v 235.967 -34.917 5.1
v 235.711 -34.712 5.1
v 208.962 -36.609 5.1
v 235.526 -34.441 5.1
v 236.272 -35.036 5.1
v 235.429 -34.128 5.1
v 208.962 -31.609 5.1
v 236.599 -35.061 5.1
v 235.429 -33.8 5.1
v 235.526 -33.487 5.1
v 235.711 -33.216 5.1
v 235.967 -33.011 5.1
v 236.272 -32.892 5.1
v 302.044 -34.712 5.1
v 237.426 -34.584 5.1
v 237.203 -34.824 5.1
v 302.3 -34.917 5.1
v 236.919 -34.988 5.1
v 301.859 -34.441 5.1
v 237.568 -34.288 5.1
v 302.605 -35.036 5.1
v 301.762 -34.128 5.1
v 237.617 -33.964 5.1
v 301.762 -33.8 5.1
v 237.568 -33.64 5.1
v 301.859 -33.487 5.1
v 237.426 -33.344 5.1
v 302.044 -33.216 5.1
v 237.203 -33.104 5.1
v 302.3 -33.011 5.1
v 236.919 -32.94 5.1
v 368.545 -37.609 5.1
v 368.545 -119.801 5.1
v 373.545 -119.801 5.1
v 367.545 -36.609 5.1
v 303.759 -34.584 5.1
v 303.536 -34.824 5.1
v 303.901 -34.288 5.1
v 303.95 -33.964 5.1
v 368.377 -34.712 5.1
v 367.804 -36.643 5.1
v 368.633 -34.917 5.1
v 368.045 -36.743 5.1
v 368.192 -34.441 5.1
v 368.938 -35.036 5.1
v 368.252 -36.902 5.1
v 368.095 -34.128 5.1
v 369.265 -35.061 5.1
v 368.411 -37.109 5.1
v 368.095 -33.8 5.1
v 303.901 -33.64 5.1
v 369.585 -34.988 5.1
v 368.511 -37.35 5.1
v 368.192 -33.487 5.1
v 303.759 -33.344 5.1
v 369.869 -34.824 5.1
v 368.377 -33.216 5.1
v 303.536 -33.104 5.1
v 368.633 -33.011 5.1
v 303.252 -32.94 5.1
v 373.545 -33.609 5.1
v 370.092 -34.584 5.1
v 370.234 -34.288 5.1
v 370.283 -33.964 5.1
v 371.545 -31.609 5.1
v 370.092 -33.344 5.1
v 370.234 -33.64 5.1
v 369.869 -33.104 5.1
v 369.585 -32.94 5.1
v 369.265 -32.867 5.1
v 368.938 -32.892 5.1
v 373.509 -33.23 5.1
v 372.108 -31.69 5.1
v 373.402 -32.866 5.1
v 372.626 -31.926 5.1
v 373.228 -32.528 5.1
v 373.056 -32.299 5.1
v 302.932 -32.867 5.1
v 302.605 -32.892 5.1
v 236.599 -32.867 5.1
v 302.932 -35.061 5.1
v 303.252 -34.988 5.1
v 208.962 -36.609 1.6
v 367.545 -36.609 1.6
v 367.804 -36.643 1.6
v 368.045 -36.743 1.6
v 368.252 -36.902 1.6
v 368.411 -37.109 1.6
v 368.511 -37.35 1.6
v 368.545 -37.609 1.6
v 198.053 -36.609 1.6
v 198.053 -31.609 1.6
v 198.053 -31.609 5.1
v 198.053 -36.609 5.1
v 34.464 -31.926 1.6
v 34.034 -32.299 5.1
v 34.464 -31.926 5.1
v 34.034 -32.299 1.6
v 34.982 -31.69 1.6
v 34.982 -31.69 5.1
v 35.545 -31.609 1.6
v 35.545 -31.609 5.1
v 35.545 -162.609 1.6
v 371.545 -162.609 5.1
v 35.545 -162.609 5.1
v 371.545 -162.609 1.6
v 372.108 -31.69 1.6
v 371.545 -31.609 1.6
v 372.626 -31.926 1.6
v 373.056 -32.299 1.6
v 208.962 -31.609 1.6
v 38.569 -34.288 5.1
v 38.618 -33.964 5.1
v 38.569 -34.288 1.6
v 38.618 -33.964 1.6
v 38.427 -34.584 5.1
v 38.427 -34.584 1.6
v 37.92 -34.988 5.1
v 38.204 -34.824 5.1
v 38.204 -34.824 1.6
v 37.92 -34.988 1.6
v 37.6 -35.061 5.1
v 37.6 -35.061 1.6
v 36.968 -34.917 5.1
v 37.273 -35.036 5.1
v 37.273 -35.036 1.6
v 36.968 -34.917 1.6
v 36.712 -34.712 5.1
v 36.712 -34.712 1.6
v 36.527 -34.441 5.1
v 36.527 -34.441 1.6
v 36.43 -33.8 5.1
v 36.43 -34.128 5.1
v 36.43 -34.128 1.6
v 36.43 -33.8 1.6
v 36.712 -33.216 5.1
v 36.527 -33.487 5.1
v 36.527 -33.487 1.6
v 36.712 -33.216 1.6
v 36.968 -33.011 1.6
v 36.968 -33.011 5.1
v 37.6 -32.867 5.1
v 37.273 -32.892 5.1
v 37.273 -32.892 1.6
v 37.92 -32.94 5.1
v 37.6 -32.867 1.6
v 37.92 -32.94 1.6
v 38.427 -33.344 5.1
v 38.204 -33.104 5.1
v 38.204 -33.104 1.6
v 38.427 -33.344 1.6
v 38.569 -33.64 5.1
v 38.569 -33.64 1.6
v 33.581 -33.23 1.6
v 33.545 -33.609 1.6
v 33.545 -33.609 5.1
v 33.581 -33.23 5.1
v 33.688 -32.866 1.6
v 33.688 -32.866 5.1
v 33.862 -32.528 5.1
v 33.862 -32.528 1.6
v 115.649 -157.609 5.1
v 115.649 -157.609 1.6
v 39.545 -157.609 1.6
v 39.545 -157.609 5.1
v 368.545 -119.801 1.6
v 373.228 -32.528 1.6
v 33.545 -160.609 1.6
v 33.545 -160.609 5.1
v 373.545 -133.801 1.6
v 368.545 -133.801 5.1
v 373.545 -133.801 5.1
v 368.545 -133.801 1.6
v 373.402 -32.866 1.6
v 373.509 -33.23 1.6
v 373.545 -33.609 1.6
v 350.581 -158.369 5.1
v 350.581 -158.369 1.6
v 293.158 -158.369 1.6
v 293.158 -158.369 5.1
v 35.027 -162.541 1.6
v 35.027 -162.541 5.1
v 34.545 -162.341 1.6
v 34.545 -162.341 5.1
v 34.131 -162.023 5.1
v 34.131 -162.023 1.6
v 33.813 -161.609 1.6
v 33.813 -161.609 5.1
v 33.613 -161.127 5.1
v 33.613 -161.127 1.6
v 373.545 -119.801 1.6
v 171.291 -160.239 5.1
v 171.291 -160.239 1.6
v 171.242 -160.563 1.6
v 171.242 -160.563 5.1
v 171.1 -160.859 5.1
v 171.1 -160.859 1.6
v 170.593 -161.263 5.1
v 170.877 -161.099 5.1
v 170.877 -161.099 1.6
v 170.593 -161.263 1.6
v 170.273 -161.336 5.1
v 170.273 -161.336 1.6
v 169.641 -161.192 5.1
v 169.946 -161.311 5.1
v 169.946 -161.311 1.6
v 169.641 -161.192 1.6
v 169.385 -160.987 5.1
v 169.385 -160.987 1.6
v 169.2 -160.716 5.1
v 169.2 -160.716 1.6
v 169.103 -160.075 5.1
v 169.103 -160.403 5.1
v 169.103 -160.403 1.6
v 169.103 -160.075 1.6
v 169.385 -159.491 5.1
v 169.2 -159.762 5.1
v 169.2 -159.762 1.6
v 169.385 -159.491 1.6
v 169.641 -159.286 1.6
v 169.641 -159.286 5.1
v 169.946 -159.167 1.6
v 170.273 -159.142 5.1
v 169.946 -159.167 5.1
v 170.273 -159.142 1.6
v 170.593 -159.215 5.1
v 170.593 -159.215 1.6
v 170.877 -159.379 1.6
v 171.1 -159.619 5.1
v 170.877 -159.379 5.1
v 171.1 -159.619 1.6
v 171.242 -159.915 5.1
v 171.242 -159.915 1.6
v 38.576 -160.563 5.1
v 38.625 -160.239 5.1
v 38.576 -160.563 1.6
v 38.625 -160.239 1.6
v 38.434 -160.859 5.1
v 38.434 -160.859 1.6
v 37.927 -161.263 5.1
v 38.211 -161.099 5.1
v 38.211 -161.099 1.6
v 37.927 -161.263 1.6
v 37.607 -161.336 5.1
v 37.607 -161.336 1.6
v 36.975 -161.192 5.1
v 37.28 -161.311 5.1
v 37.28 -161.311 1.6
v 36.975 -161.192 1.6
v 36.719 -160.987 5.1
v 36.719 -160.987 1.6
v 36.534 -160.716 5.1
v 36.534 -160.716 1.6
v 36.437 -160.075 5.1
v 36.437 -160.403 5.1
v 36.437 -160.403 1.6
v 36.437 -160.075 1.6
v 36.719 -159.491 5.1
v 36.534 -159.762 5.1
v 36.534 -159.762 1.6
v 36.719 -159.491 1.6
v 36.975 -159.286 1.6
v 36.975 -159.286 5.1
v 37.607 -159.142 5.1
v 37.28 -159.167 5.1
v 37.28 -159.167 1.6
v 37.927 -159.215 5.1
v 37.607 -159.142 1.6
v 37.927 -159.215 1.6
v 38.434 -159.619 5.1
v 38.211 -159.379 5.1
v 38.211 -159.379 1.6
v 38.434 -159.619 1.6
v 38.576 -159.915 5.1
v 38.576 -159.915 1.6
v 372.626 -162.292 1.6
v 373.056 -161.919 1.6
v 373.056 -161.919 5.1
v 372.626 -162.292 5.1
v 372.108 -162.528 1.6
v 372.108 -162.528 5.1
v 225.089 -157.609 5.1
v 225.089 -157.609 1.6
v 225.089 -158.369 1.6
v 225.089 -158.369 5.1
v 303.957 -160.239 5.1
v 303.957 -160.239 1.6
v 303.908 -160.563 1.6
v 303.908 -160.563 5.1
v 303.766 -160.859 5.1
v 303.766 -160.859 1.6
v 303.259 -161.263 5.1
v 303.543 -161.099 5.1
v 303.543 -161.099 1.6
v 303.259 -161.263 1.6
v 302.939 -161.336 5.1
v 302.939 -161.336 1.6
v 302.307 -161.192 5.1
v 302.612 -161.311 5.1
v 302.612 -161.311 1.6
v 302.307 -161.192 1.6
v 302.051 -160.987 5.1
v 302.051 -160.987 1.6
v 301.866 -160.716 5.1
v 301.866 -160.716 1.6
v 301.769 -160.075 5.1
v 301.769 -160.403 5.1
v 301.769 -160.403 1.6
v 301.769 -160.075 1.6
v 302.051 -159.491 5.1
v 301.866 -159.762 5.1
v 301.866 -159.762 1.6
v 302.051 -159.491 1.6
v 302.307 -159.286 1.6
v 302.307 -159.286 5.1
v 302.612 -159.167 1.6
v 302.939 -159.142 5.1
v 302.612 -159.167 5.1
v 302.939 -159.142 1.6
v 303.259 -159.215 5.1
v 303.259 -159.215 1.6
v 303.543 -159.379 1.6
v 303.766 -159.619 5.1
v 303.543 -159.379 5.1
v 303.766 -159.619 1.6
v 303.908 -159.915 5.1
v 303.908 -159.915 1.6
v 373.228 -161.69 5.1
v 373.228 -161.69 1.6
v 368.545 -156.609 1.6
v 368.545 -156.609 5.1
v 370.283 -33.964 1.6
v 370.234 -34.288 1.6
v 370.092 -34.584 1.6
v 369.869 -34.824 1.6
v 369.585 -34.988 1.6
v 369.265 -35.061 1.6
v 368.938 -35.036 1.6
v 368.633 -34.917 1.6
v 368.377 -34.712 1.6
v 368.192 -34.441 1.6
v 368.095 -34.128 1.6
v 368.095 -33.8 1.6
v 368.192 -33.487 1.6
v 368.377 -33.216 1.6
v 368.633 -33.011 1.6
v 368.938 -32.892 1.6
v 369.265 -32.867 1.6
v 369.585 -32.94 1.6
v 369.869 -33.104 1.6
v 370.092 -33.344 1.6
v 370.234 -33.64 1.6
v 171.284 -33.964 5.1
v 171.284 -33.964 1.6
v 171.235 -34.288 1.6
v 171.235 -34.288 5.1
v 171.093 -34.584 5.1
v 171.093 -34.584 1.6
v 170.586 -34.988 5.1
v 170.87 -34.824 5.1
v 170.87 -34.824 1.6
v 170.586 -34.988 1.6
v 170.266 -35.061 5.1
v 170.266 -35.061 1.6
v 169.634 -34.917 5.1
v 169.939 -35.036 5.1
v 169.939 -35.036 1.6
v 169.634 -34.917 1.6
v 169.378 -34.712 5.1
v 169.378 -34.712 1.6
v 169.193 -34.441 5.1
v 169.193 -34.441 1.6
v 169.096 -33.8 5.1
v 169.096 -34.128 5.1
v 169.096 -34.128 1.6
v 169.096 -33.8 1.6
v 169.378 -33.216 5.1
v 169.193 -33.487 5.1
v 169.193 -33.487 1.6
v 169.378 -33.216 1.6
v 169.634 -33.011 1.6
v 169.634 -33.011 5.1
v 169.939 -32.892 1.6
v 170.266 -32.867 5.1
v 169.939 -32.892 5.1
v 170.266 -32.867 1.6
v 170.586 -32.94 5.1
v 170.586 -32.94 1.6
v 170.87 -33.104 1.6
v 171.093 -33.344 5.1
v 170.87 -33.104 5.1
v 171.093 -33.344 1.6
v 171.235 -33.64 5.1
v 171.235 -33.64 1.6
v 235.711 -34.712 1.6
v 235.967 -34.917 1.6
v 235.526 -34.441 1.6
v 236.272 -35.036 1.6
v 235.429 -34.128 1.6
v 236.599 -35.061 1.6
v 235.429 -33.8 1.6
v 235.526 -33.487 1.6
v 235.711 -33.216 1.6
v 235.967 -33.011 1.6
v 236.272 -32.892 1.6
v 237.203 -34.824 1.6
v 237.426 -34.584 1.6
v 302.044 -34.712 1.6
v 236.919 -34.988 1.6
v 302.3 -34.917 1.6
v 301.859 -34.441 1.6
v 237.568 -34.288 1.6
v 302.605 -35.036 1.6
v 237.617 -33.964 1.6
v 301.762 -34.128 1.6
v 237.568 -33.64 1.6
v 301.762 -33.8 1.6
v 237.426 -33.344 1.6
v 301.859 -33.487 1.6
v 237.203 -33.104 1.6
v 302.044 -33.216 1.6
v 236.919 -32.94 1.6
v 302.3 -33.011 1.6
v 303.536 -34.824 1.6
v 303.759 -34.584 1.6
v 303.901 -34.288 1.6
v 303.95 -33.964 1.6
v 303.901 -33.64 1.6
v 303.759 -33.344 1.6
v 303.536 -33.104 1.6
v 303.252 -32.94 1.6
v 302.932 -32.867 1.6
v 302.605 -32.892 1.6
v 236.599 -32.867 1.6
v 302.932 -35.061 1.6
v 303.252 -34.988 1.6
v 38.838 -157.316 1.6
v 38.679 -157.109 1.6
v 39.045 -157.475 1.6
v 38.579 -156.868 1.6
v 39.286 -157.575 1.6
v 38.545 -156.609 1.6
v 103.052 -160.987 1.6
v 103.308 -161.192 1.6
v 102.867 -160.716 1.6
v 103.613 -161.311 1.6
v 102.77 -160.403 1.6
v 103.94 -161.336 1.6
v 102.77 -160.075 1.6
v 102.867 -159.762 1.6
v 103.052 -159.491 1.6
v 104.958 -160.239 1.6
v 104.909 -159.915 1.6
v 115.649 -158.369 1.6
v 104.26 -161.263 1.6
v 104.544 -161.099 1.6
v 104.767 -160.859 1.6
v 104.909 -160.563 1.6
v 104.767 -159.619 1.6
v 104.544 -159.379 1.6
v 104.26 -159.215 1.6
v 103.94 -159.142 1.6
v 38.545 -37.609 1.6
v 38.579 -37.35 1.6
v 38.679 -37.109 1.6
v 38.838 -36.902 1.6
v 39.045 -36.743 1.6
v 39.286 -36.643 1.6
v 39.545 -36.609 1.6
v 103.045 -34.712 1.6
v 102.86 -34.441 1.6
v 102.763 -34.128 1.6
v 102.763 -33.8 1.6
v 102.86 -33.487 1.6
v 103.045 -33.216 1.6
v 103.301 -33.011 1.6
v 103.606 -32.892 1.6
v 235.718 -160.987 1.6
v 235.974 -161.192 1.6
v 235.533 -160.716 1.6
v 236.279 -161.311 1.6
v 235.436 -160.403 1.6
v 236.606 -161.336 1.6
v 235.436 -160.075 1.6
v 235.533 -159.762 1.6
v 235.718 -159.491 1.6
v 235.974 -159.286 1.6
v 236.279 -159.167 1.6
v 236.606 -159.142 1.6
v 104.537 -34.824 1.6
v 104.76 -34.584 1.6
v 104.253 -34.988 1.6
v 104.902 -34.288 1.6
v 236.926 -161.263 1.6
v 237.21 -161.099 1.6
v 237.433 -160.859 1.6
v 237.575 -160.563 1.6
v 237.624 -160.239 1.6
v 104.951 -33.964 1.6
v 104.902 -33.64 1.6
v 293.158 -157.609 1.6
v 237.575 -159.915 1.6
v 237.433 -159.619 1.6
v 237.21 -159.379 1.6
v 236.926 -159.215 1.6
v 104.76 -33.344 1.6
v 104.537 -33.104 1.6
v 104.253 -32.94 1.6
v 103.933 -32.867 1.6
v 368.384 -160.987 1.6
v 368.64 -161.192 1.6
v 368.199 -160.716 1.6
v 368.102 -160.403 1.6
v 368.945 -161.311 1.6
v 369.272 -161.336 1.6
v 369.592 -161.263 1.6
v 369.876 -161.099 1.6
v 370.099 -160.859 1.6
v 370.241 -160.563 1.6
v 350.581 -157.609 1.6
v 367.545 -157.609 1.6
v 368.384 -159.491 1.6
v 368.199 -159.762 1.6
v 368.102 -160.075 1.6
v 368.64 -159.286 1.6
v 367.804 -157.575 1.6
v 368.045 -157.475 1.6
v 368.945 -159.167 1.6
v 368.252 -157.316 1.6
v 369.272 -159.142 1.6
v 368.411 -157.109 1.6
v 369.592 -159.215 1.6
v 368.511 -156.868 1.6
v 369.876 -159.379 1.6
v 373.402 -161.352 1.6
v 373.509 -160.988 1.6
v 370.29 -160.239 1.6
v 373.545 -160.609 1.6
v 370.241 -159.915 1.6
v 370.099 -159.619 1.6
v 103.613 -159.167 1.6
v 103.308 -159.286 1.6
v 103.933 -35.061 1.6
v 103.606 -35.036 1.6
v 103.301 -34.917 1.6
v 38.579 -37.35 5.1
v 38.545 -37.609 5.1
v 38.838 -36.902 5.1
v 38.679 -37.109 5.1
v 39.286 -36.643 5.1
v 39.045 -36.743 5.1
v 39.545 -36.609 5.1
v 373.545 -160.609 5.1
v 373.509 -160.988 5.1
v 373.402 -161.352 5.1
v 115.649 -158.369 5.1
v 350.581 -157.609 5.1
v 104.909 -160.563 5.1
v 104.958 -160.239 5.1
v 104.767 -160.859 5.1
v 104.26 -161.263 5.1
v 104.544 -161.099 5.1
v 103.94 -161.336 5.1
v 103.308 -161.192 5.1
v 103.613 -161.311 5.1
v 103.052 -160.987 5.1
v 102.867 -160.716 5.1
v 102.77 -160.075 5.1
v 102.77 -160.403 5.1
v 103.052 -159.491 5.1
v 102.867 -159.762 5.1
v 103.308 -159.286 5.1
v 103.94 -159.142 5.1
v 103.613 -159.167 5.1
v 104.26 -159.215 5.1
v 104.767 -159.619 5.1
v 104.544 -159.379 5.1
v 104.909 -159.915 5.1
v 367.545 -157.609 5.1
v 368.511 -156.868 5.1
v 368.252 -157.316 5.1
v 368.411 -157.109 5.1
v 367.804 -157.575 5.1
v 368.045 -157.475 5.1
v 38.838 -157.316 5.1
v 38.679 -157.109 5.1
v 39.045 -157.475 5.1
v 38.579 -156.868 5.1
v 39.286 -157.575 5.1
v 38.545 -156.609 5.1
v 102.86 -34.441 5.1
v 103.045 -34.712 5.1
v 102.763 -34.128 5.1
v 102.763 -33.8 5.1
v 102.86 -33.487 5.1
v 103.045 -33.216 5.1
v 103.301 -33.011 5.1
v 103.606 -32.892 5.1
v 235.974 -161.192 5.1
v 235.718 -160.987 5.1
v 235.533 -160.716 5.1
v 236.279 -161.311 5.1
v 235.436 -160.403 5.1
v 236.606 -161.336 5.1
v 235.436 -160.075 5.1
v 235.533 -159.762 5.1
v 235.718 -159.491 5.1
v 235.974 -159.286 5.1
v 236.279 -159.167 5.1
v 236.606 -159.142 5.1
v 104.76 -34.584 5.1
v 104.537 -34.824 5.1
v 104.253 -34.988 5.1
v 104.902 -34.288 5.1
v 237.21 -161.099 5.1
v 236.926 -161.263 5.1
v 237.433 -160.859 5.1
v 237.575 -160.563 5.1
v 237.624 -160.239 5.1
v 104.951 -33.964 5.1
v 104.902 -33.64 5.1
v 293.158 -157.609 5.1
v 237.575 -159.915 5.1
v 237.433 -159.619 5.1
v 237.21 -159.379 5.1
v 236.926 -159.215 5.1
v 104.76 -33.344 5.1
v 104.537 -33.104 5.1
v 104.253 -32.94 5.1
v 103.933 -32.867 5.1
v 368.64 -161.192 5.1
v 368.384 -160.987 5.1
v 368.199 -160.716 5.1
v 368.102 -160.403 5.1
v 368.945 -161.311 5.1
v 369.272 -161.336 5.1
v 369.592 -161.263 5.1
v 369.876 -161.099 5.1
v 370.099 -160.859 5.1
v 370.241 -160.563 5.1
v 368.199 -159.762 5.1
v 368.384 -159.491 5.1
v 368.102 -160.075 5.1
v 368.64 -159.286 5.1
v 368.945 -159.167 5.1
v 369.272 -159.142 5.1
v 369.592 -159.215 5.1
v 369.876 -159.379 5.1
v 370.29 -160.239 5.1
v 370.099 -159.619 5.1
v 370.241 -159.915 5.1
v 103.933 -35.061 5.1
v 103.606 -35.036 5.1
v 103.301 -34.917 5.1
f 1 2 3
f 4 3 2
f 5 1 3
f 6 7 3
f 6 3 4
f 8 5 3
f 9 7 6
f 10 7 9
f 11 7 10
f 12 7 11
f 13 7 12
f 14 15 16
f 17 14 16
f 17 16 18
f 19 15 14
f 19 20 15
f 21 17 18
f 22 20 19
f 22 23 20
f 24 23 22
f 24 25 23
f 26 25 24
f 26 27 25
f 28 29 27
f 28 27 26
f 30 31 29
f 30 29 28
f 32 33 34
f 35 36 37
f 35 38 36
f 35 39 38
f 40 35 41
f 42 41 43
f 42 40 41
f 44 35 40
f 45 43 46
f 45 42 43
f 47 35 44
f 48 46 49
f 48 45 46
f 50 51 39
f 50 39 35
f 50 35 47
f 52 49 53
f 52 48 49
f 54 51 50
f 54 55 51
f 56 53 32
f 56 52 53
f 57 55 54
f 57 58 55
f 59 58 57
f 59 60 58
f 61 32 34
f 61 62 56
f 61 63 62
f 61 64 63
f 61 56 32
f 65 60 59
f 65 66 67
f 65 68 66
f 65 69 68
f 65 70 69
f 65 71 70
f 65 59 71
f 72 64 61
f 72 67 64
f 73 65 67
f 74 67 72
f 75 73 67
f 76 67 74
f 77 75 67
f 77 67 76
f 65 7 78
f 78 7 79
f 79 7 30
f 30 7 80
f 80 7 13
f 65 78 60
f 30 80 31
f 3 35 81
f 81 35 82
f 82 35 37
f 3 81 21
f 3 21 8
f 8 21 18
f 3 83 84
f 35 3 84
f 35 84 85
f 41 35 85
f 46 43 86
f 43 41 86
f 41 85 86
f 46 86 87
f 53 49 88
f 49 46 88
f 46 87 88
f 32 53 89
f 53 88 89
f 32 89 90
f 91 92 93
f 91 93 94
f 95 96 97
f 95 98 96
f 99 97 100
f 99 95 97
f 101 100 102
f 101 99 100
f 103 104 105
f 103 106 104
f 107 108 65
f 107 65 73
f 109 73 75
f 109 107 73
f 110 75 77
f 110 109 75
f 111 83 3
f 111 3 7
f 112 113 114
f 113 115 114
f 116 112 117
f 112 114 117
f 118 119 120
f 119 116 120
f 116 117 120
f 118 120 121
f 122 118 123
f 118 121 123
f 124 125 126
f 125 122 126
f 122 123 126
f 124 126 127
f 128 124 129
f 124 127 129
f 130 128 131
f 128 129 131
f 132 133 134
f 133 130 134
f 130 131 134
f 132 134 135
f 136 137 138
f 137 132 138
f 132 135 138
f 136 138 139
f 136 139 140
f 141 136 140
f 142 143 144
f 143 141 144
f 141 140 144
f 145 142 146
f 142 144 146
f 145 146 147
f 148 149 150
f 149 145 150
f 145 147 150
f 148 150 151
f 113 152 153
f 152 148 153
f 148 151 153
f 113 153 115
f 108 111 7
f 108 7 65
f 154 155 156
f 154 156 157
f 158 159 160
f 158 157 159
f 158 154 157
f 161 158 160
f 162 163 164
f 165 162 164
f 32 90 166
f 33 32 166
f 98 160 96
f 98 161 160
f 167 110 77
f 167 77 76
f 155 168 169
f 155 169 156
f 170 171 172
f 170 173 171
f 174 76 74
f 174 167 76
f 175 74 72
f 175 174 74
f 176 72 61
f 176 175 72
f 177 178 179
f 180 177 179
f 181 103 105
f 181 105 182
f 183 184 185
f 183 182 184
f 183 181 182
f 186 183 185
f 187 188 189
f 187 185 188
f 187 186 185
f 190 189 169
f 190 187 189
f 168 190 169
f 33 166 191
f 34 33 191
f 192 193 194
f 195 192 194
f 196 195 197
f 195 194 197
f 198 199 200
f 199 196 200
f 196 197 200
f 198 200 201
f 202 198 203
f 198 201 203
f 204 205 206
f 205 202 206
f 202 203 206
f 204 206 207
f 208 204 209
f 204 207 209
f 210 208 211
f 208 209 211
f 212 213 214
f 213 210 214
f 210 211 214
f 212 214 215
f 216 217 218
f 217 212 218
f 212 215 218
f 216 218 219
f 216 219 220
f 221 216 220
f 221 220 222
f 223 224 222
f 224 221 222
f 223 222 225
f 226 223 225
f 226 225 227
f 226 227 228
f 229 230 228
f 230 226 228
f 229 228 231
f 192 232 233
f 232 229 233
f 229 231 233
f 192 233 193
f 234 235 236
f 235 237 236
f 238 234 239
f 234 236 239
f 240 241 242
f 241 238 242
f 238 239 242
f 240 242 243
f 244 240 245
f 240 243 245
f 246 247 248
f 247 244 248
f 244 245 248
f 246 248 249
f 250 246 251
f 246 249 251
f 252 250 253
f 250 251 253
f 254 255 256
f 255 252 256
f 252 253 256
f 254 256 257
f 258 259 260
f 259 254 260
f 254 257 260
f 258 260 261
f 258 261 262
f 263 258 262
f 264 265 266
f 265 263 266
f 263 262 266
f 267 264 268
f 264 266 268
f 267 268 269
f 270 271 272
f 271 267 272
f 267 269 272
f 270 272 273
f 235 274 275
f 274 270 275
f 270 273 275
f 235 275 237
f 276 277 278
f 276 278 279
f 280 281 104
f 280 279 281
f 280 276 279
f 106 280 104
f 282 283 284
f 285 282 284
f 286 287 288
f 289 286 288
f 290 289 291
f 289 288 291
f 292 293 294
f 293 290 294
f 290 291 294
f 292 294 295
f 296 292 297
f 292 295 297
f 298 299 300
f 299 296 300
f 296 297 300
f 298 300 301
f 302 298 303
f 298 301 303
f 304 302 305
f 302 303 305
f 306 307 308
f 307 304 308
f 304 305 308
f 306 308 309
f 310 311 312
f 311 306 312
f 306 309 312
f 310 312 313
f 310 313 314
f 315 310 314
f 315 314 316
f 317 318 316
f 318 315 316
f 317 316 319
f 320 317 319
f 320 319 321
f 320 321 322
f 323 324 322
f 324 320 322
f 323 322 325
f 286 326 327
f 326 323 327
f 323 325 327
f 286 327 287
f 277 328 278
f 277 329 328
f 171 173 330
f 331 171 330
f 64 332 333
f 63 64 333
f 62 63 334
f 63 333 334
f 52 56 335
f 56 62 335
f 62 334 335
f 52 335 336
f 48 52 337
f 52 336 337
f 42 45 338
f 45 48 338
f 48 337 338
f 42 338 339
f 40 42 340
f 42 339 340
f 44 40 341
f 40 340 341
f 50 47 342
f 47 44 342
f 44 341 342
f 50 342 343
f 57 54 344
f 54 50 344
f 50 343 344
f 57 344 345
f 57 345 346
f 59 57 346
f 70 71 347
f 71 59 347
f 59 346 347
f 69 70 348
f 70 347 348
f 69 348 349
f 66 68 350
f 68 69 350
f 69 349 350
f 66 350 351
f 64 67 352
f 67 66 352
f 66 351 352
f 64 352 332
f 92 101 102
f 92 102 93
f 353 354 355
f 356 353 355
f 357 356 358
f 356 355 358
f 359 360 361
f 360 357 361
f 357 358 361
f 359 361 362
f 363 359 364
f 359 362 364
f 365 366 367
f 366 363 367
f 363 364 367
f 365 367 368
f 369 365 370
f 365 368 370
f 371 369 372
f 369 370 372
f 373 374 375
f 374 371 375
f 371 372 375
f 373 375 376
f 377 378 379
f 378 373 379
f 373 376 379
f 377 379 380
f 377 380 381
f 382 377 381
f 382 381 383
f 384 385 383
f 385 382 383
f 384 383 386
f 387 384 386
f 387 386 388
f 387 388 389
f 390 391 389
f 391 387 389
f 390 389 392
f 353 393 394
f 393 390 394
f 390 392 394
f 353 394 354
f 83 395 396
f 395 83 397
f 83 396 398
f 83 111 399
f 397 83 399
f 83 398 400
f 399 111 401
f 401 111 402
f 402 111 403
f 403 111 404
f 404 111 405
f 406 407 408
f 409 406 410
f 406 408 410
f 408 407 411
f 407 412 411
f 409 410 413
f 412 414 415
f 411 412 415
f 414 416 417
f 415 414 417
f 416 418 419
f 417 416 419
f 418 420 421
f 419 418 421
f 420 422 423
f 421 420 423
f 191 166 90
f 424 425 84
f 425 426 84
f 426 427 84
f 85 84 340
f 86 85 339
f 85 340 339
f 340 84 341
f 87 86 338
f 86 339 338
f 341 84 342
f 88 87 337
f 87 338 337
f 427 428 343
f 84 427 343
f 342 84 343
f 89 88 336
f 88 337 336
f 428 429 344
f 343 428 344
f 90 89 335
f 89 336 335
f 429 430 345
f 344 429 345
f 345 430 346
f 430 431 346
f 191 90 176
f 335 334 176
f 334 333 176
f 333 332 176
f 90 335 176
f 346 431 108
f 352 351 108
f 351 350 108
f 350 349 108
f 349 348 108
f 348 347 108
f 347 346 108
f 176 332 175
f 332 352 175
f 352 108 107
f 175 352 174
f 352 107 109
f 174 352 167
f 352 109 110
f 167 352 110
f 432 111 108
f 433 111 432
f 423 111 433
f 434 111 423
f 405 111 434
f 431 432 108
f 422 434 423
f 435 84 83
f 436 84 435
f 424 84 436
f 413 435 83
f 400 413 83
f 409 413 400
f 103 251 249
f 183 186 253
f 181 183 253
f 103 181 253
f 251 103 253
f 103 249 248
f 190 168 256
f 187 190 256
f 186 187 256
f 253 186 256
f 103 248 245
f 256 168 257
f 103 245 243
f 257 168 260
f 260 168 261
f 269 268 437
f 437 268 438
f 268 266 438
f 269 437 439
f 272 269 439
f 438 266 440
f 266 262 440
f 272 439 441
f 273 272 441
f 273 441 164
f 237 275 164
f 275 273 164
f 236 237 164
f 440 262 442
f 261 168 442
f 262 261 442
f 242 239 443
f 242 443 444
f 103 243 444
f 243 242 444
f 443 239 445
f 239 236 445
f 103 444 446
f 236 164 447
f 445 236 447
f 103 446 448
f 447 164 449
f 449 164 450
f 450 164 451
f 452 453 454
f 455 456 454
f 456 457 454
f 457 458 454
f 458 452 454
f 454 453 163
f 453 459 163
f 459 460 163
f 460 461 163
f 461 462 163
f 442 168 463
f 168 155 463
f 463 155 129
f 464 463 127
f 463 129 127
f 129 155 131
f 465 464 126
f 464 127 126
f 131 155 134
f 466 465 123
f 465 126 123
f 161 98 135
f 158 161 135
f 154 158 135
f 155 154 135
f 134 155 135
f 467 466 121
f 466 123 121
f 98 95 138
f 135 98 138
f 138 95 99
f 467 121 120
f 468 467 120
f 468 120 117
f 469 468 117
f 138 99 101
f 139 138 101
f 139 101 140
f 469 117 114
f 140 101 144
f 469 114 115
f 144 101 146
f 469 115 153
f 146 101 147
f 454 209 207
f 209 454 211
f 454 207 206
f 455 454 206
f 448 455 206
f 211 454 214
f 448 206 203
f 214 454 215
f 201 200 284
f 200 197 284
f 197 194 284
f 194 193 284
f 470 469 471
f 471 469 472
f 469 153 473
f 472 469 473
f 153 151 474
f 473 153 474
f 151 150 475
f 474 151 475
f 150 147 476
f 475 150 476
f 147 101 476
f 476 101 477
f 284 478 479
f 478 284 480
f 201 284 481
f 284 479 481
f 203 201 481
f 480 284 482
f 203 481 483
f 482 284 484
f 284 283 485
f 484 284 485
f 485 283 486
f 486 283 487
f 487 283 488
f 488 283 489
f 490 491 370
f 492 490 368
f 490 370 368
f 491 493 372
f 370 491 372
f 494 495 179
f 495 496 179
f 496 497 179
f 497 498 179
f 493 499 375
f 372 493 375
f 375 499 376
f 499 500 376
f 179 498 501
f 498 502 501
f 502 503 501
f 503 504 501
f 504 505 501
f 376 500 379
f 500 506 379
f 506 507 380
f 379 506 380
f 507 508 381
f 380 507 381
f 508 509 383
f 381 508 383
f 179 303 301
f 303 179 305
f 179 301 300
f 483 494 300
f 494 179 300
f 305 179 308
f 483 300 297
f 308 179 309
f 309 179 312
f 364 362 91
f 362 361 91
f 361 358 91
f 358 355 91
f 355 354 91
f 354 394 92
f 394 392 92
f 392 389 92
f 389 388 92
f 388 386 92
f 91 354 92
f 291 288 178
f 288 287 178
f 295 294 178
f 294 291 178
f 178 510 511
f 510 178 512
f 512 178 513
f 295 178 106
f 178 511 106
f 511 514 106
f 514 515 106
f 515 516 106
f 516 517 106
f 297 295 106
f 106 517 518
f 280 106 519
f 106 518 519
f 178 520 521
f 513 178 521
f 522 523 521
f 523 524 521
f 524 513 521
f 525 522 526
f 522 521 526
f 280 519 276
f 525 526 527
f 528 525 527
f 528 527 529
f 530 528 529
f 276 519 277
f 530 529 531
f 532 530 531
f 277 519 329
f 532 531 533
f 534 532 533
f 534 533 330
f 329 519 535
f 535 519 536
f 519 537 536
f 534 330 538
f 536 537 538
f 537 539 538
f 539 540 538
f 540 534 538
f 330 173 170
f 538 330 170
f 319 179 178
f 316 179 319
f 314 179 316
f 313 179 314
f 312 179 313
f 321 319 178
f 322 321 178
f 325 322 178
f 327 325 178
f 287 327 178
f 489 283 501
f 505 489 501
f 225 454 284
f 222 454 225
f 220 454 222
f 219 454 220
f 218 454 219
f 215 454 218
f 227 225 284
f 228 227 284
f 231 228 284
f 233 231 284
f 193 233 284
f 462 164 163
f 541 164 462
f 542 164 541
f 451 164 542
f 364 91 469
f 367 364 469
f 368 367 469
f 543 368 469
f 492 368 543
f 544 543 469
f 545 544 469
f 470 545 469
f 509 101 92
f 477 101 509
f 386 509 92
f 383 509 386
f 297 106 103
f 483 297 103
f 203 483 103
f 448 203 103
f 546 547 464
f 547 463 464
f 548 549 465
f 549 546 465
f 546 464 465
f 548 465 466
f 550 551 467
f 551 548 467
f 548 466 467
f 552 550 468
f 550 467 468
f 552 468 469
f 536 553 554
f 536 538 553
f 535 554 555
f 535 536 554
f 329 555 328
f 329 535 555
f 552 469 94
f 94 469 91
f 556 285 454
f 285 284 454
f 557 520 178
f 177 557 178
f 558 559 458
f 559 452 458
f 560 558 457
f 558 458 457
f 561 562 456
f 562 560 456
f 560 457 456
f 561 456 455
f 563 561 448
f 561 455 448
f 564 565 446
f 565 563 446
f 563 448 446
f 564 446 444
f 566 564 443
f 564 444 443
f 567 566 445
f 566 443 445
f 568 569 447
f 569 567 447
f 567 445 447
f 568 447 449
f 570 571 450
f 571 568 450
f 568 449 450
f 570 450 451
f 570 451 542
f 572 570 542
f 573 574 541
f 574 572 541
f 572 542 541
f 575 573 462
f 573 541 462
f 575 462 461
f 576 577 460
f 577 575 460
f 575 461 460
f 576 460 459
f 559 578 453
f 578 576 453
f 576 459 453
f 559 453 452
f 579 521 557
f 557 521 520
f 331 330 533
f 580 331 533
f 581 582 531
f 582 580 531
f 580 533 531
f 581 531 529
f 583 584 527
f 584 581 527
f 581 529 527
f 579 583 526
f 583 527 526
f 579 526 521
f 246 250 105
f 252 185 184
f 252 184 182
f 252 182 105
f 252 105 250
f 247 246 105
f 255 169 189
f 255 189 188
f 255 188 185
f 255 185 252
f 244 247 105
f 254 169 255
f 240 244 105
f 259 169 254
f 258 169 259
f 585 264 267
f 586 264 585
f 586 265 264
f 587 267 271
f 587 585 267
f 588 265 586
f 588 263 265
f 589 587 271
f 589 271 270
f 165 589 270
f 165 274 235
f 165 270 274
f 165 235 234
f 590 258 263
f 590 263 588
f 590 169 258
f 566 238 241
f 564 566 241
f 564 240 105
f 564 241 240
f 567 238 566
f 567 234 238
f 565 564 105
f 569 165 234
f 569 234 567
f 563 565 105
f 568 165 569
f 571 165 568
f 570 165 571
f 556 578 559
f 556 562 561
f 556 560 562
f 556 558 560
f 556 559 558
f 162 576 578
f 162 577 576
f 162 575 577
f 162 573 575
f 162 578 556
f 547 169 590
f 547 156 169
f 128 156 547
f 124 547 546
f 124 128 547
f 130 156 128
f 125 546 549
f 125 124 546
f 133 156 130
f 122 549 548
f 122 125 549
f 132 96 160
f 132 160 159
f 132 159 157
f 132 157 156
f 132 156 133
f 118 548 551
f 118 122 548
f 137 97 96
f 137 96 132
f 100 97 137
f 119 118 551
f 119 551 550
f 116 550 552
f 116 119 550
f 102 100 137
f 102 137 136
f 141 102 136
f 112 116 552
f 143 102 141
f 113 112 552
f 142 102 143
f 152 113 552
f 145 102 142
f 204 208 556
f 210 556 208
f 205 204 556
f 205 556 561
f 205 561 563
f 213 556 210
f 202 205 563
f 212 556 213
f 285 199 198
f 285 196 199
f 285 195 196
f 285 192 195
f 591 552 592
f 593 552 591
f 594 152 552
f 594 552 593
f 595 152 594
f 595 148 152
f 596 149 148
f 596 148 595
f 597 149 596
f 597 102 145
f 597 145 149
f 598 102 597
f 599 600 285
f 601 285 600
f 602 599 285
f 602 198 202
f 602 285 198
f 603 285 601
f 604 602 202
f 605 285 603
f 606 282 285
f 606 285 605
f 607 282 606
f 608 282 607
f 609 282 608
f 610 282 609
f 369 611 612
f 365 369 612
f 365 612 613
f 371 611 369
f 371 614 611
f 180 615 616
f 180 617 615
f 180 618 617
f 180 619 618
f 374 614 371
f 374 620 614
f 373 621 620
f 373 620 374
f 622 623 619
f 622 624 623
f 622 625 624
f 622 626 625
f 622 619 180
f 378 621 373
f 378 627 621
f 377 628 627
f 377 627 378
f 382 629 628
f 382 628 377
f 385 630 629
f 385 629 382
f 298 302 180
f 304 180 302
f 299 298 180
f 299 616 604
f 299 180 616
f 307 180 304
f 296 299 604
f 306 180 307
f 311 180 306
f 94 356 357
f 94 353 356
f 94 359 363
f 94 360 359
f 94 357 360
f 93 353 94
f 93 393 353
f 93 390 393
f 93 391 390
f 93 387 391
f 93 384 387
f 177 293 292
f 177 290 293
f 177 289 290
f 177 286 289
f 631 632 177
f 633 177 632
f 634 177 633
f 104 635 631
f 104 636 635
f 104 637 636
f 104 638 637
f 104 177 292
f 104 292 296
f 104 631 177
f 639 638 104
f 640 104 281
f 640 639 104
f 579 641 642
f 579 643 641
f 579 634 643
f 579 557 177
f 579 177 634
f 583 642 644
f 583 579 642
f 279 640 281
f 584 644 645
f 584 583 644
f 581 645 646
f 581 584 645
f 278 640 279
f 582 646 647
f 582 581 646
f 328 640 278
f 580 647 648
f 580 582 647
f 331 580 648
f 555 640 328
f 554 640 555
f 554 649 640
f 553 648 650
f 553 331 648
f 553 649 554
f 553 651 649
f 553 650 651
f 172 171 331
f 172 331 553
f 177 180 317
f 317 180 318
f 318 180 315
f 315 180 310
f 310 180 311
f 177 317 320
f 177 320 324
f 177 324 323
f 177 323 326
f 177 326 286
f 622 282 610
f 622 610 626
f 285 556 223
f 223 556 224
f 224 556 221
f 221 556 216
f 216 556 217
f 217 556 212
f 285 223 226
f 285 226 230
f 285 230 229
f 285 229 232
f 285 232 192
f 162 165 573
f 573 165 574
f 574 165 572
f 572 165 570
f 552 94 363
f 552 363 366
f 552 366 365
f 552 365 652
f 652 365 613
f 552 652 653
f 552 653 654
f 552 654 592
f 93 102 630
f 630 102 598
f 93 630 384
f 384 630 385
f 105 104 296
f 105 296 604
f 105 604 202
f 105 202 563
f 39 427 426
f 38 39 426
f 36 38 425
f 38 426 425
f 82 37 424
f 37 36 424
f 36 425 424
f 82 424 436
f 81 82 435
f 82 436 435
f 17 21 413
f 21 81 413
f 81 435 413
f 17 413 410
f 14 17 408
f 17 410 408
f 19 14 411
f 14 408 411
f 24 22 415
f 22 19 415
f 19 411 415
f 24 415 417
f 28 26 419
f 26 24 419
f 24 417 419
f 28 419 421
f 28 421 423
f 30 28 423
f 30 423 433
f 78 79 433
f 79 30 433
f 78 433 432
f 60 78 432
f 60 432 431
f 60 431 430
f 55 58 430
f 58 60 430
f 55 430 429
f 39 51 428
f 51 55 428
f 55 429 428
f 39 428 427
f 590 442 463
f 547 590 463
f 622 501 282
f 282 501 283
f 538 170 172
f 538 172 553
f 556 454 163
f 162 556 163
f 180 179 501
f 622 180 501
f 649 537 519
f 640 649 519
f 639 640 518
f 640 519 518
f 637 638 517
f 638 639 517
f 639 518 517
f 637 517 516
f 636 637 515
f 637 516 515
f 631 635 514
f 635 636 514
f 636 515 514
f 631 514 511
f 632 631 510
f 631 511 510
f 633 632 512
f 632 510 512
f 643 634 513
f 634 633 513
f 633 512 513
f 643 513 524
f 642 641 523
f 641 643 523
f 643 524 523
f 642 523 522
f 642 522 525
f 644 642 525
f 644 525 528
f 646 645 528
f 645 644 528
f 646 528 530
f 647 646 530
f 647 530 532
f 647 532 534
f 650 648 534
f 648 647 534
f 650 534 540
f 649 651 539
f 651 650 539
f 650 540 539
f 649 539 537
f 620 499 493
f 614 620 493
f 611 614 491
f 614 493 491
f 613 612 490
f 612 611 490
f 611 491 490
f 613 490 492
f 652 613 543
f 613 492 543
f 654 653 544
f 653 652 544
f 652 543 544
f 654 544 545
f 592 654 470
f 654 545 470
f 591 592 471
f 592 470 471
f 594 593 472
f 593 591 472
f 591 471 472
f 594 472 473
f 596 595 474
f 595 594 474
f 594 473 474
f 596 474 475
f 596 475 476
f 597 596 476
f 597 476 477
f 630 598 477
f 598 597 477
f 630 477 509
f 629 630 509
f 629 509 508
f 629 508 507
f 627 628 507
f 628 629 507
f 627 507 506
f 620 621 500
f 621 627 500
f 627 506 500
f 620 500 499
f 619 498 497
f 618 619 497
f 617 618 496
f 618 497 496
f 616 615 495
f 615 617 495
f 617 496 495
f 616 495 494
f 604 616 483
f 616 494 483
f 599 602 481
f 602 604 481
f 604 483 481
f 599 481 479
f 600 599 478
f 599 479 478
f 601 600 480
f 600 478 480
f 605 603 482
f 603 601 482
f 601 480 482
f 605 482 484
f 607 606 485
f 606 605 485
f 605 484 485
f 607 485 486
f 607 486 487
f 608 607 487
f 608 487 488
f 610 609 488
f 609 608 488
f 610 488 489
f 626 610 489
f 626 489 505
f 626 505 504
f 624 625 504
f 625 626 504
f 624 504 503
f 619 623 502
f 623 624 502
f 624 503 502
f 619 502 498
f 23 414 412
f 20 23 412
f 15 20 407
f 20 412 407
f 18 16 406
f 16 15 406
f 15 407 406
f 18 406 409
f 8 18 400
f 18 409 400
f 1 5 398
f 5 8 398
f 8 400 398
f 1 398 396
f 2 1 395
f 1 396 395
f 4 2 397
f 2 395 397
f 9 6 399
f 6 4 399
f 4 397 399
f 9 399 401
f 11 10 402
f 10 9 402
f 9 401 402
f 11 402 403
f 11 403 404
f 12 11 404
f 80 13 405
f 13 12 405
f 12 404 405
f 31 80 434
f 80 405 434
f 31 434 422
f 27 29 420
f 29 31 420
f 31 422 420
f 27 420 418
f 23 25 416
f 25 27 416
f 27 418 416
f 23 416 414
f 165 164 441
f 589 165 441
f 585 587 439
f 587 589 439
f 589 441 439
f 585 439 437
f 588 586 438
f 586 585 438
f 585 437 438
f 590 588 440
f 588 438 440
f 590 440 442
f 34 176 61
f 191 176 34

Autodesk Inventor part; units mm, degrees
ref_plane "YZ Plane" through (0, 0, 0) normal (1, 0, 0) x (0, 1, 0)
ref_plane "XZ Plane" through (0, 0, 0) normal (0, 1, 0) x (-1, 0, 0)
ref_plane "XY Plane" through (0, 0, 0) normal (0, 0, 1) x (1, 0, 0)
ref_plane "Work Plane2" through (35.545, -31.609, 1.6) normal (0, 0, 1) x (1, 0, 0)
ref_plane "Work Plane1" through (35.545, -31.609, 1.6) normal (0, 0, 1) x (1, 0, 0)
sketch "Sketch1" plane through (35.545, -31.609, 1.6) normal (0, 0, 1) x (1, 0, 0)
  line L0 (0, 0) -> (336, 0) projected
  line L1 (-2, -129) -> (-2, -2) projected
  line L2 (-1.6825, -0.9187) -> (-1.5115, -0.6903) projected
  arc A0 (0, 0) -> (-2, -2) centre (0, -2) ccw
  line L3 (338, -2) -> (338, -129) projected
  line L4 (337.5115, -0.6903) -> (337.6825, -0.9187) projected
  arc A1 (338, -2) -> (336, 0) centre (336, -2) ccw
  line L5 (336, -131) -> (0, -131) projected
  line L6 (337.6825, -130.0813) -> (337.5115, -130.3097) projected
  arc A2 (336, -131) -> (338, -129) centre (336, -129) ccw
  arc A3 (-2, -129) -> (0, -131) centre (0, -129) ccw
  circle A4 centre (1.98, -128.63) radius 1.1 projected
  circle A5 centre (1.98, -128.63) radius 1.1
  circle A6 centre (68.313, -128.63) radius 1.1 projected
  circle A7 centre (134.646, -128.63) radius 1.1 projected
  circle A8 centre (134.646, -128.63) radius 1.1
  circle A9 centre (68.313, -128.63) radius 1.1
  circle A10 centre (200.979, -128.63) radius 1.1 projected
  circle A11 centre (267.312, -128.63) radius 1.1 projected
  circle A12 centre (333.645, -128.63) radius 1.1 projected
  circle A13 centre (333.645, -128.63) radius 1.1
  circle A14 centre (267.312, -128.63) radius 1.1
  circle A15 centre (200.979, -128.63) radius 1.1
  circle A16 centre (333.638, -2.355) radius 1.1 projected
  circle A17 centre (1.973, -2.355) radius 1.1 projected
  circle A18 centre (68.306, -2.355) radius 1.1 projected
  circle A19 centre (134.639, -2.355) radius 1.1 projected
  circle A20 centre (200.972, -2.355) radius 1.1 projected
  circle A21 centre (267.305, -2.355) radius 1.1 projected
  circle A22 centre (333.645, -2.355) radius 1.093
  circle A23 centre (267.305, -2.355) radius 1.1
  circle A24 centre (200.972, -2.355) radius 1.1
  circle A25 centre (134.639, -2.355) radius 1.1
  circle A26 centre (68.306, -2.355) radius 1.1
  circle A27 centre (1.973, -2.355) radius 1.1
  line L7 (3, -4.2357) -> (125.2758, -4.2357) construction
  line L8 (4, -5) -> (332, -5)
  line L9 (333, -6) -> (333, -125)
  line L10 (332, -126) -> (4, -126)
  line L11 (3, -125) -> (3, -6)
  arc A28 (4, -5) -> (3, -6) centre (4, -6) ccw
  arc A29 (333, -6) -> (332, -5) centre (332, -6) ccw
  arc A30 (332, -126) -> (333, -125) centre (332, -125) ccw
  arc A31 (3, -125) -> (4, -126) centre (4, -125) ccw
  line L12 (162.5077, 0) -> (162.5077, -5)
  line L13 (173.4174, -5) -> (173.4174, 0)
  circle A32 centre (320.737, -95.692) radius 0.175 projected
  line L14 (333, -88.192) -> (338, -88.192)
  line L15 (333, -102.192) -> (338, -102.192)
  line L16 (257.6125, -126) -> (315.0362, -126)
  line L17 (315.0362, -126) -> (315.0362, -126.7604)
  line L18 (315.0362, -126.7604) -> (257.6125, -126.7604)
  line L19 (257.6125, -126.7604) -> (257.6125, -126)
  line L20 (-4.56, 3.0996) -> (341.5314, 2.9535) construction
  line L21 (341.5314, 2.9535) -> (341.4736, -133.9948) construction
  line L22 (341.4736, -133.9948) -> (-4.6178, -133.8488) construction
  line L23 (-4.6178, -133.8488) -> (-4.56, 3.0996) construction
  line L24 (80.1037, -126) -> (189.5438, -126)
  line L25 (189.5438, -126) -> (189.5438, -126.7604)
  line L26 (189.5438, -126.7604) -> (80.1037, -126.7604)
  line L27 (80.1037, -126.7604) -> (80.1037, -126)
  point P0 (-35.545, 31.609)
  point P1 (-1.5115, -130.3097)
  point P2 (335.5, -88.192)
  point P3 (0, -131)
  point P4 (337.6825, -130.0813)
  point P5 (-1.6825, -0.9187)
  point P6 (337.6825, -0.9187)
  dimension "d2" = 5
  dimension "d3" = 5
  dimension "d4" = 5
  dimension "d5" = 5
  dimension "d6" = 1
  dimension "d7" = 1
  dimension "d8" = 1
  dimension "d9" = 1
extrude "Extrusion3" add sketch "Sketch1" along normal blind 3.5 contours L0 L12 L8 A28 L11 A31 L10 L27 L26 L25 L19 L18 L17 A30 L9 L15 L3 A2 L6 L5 A3 L1 A0 L2 | L0 A1 L4 L3 L14 L9 A29 L8 L13
properties part number "open_liner"
